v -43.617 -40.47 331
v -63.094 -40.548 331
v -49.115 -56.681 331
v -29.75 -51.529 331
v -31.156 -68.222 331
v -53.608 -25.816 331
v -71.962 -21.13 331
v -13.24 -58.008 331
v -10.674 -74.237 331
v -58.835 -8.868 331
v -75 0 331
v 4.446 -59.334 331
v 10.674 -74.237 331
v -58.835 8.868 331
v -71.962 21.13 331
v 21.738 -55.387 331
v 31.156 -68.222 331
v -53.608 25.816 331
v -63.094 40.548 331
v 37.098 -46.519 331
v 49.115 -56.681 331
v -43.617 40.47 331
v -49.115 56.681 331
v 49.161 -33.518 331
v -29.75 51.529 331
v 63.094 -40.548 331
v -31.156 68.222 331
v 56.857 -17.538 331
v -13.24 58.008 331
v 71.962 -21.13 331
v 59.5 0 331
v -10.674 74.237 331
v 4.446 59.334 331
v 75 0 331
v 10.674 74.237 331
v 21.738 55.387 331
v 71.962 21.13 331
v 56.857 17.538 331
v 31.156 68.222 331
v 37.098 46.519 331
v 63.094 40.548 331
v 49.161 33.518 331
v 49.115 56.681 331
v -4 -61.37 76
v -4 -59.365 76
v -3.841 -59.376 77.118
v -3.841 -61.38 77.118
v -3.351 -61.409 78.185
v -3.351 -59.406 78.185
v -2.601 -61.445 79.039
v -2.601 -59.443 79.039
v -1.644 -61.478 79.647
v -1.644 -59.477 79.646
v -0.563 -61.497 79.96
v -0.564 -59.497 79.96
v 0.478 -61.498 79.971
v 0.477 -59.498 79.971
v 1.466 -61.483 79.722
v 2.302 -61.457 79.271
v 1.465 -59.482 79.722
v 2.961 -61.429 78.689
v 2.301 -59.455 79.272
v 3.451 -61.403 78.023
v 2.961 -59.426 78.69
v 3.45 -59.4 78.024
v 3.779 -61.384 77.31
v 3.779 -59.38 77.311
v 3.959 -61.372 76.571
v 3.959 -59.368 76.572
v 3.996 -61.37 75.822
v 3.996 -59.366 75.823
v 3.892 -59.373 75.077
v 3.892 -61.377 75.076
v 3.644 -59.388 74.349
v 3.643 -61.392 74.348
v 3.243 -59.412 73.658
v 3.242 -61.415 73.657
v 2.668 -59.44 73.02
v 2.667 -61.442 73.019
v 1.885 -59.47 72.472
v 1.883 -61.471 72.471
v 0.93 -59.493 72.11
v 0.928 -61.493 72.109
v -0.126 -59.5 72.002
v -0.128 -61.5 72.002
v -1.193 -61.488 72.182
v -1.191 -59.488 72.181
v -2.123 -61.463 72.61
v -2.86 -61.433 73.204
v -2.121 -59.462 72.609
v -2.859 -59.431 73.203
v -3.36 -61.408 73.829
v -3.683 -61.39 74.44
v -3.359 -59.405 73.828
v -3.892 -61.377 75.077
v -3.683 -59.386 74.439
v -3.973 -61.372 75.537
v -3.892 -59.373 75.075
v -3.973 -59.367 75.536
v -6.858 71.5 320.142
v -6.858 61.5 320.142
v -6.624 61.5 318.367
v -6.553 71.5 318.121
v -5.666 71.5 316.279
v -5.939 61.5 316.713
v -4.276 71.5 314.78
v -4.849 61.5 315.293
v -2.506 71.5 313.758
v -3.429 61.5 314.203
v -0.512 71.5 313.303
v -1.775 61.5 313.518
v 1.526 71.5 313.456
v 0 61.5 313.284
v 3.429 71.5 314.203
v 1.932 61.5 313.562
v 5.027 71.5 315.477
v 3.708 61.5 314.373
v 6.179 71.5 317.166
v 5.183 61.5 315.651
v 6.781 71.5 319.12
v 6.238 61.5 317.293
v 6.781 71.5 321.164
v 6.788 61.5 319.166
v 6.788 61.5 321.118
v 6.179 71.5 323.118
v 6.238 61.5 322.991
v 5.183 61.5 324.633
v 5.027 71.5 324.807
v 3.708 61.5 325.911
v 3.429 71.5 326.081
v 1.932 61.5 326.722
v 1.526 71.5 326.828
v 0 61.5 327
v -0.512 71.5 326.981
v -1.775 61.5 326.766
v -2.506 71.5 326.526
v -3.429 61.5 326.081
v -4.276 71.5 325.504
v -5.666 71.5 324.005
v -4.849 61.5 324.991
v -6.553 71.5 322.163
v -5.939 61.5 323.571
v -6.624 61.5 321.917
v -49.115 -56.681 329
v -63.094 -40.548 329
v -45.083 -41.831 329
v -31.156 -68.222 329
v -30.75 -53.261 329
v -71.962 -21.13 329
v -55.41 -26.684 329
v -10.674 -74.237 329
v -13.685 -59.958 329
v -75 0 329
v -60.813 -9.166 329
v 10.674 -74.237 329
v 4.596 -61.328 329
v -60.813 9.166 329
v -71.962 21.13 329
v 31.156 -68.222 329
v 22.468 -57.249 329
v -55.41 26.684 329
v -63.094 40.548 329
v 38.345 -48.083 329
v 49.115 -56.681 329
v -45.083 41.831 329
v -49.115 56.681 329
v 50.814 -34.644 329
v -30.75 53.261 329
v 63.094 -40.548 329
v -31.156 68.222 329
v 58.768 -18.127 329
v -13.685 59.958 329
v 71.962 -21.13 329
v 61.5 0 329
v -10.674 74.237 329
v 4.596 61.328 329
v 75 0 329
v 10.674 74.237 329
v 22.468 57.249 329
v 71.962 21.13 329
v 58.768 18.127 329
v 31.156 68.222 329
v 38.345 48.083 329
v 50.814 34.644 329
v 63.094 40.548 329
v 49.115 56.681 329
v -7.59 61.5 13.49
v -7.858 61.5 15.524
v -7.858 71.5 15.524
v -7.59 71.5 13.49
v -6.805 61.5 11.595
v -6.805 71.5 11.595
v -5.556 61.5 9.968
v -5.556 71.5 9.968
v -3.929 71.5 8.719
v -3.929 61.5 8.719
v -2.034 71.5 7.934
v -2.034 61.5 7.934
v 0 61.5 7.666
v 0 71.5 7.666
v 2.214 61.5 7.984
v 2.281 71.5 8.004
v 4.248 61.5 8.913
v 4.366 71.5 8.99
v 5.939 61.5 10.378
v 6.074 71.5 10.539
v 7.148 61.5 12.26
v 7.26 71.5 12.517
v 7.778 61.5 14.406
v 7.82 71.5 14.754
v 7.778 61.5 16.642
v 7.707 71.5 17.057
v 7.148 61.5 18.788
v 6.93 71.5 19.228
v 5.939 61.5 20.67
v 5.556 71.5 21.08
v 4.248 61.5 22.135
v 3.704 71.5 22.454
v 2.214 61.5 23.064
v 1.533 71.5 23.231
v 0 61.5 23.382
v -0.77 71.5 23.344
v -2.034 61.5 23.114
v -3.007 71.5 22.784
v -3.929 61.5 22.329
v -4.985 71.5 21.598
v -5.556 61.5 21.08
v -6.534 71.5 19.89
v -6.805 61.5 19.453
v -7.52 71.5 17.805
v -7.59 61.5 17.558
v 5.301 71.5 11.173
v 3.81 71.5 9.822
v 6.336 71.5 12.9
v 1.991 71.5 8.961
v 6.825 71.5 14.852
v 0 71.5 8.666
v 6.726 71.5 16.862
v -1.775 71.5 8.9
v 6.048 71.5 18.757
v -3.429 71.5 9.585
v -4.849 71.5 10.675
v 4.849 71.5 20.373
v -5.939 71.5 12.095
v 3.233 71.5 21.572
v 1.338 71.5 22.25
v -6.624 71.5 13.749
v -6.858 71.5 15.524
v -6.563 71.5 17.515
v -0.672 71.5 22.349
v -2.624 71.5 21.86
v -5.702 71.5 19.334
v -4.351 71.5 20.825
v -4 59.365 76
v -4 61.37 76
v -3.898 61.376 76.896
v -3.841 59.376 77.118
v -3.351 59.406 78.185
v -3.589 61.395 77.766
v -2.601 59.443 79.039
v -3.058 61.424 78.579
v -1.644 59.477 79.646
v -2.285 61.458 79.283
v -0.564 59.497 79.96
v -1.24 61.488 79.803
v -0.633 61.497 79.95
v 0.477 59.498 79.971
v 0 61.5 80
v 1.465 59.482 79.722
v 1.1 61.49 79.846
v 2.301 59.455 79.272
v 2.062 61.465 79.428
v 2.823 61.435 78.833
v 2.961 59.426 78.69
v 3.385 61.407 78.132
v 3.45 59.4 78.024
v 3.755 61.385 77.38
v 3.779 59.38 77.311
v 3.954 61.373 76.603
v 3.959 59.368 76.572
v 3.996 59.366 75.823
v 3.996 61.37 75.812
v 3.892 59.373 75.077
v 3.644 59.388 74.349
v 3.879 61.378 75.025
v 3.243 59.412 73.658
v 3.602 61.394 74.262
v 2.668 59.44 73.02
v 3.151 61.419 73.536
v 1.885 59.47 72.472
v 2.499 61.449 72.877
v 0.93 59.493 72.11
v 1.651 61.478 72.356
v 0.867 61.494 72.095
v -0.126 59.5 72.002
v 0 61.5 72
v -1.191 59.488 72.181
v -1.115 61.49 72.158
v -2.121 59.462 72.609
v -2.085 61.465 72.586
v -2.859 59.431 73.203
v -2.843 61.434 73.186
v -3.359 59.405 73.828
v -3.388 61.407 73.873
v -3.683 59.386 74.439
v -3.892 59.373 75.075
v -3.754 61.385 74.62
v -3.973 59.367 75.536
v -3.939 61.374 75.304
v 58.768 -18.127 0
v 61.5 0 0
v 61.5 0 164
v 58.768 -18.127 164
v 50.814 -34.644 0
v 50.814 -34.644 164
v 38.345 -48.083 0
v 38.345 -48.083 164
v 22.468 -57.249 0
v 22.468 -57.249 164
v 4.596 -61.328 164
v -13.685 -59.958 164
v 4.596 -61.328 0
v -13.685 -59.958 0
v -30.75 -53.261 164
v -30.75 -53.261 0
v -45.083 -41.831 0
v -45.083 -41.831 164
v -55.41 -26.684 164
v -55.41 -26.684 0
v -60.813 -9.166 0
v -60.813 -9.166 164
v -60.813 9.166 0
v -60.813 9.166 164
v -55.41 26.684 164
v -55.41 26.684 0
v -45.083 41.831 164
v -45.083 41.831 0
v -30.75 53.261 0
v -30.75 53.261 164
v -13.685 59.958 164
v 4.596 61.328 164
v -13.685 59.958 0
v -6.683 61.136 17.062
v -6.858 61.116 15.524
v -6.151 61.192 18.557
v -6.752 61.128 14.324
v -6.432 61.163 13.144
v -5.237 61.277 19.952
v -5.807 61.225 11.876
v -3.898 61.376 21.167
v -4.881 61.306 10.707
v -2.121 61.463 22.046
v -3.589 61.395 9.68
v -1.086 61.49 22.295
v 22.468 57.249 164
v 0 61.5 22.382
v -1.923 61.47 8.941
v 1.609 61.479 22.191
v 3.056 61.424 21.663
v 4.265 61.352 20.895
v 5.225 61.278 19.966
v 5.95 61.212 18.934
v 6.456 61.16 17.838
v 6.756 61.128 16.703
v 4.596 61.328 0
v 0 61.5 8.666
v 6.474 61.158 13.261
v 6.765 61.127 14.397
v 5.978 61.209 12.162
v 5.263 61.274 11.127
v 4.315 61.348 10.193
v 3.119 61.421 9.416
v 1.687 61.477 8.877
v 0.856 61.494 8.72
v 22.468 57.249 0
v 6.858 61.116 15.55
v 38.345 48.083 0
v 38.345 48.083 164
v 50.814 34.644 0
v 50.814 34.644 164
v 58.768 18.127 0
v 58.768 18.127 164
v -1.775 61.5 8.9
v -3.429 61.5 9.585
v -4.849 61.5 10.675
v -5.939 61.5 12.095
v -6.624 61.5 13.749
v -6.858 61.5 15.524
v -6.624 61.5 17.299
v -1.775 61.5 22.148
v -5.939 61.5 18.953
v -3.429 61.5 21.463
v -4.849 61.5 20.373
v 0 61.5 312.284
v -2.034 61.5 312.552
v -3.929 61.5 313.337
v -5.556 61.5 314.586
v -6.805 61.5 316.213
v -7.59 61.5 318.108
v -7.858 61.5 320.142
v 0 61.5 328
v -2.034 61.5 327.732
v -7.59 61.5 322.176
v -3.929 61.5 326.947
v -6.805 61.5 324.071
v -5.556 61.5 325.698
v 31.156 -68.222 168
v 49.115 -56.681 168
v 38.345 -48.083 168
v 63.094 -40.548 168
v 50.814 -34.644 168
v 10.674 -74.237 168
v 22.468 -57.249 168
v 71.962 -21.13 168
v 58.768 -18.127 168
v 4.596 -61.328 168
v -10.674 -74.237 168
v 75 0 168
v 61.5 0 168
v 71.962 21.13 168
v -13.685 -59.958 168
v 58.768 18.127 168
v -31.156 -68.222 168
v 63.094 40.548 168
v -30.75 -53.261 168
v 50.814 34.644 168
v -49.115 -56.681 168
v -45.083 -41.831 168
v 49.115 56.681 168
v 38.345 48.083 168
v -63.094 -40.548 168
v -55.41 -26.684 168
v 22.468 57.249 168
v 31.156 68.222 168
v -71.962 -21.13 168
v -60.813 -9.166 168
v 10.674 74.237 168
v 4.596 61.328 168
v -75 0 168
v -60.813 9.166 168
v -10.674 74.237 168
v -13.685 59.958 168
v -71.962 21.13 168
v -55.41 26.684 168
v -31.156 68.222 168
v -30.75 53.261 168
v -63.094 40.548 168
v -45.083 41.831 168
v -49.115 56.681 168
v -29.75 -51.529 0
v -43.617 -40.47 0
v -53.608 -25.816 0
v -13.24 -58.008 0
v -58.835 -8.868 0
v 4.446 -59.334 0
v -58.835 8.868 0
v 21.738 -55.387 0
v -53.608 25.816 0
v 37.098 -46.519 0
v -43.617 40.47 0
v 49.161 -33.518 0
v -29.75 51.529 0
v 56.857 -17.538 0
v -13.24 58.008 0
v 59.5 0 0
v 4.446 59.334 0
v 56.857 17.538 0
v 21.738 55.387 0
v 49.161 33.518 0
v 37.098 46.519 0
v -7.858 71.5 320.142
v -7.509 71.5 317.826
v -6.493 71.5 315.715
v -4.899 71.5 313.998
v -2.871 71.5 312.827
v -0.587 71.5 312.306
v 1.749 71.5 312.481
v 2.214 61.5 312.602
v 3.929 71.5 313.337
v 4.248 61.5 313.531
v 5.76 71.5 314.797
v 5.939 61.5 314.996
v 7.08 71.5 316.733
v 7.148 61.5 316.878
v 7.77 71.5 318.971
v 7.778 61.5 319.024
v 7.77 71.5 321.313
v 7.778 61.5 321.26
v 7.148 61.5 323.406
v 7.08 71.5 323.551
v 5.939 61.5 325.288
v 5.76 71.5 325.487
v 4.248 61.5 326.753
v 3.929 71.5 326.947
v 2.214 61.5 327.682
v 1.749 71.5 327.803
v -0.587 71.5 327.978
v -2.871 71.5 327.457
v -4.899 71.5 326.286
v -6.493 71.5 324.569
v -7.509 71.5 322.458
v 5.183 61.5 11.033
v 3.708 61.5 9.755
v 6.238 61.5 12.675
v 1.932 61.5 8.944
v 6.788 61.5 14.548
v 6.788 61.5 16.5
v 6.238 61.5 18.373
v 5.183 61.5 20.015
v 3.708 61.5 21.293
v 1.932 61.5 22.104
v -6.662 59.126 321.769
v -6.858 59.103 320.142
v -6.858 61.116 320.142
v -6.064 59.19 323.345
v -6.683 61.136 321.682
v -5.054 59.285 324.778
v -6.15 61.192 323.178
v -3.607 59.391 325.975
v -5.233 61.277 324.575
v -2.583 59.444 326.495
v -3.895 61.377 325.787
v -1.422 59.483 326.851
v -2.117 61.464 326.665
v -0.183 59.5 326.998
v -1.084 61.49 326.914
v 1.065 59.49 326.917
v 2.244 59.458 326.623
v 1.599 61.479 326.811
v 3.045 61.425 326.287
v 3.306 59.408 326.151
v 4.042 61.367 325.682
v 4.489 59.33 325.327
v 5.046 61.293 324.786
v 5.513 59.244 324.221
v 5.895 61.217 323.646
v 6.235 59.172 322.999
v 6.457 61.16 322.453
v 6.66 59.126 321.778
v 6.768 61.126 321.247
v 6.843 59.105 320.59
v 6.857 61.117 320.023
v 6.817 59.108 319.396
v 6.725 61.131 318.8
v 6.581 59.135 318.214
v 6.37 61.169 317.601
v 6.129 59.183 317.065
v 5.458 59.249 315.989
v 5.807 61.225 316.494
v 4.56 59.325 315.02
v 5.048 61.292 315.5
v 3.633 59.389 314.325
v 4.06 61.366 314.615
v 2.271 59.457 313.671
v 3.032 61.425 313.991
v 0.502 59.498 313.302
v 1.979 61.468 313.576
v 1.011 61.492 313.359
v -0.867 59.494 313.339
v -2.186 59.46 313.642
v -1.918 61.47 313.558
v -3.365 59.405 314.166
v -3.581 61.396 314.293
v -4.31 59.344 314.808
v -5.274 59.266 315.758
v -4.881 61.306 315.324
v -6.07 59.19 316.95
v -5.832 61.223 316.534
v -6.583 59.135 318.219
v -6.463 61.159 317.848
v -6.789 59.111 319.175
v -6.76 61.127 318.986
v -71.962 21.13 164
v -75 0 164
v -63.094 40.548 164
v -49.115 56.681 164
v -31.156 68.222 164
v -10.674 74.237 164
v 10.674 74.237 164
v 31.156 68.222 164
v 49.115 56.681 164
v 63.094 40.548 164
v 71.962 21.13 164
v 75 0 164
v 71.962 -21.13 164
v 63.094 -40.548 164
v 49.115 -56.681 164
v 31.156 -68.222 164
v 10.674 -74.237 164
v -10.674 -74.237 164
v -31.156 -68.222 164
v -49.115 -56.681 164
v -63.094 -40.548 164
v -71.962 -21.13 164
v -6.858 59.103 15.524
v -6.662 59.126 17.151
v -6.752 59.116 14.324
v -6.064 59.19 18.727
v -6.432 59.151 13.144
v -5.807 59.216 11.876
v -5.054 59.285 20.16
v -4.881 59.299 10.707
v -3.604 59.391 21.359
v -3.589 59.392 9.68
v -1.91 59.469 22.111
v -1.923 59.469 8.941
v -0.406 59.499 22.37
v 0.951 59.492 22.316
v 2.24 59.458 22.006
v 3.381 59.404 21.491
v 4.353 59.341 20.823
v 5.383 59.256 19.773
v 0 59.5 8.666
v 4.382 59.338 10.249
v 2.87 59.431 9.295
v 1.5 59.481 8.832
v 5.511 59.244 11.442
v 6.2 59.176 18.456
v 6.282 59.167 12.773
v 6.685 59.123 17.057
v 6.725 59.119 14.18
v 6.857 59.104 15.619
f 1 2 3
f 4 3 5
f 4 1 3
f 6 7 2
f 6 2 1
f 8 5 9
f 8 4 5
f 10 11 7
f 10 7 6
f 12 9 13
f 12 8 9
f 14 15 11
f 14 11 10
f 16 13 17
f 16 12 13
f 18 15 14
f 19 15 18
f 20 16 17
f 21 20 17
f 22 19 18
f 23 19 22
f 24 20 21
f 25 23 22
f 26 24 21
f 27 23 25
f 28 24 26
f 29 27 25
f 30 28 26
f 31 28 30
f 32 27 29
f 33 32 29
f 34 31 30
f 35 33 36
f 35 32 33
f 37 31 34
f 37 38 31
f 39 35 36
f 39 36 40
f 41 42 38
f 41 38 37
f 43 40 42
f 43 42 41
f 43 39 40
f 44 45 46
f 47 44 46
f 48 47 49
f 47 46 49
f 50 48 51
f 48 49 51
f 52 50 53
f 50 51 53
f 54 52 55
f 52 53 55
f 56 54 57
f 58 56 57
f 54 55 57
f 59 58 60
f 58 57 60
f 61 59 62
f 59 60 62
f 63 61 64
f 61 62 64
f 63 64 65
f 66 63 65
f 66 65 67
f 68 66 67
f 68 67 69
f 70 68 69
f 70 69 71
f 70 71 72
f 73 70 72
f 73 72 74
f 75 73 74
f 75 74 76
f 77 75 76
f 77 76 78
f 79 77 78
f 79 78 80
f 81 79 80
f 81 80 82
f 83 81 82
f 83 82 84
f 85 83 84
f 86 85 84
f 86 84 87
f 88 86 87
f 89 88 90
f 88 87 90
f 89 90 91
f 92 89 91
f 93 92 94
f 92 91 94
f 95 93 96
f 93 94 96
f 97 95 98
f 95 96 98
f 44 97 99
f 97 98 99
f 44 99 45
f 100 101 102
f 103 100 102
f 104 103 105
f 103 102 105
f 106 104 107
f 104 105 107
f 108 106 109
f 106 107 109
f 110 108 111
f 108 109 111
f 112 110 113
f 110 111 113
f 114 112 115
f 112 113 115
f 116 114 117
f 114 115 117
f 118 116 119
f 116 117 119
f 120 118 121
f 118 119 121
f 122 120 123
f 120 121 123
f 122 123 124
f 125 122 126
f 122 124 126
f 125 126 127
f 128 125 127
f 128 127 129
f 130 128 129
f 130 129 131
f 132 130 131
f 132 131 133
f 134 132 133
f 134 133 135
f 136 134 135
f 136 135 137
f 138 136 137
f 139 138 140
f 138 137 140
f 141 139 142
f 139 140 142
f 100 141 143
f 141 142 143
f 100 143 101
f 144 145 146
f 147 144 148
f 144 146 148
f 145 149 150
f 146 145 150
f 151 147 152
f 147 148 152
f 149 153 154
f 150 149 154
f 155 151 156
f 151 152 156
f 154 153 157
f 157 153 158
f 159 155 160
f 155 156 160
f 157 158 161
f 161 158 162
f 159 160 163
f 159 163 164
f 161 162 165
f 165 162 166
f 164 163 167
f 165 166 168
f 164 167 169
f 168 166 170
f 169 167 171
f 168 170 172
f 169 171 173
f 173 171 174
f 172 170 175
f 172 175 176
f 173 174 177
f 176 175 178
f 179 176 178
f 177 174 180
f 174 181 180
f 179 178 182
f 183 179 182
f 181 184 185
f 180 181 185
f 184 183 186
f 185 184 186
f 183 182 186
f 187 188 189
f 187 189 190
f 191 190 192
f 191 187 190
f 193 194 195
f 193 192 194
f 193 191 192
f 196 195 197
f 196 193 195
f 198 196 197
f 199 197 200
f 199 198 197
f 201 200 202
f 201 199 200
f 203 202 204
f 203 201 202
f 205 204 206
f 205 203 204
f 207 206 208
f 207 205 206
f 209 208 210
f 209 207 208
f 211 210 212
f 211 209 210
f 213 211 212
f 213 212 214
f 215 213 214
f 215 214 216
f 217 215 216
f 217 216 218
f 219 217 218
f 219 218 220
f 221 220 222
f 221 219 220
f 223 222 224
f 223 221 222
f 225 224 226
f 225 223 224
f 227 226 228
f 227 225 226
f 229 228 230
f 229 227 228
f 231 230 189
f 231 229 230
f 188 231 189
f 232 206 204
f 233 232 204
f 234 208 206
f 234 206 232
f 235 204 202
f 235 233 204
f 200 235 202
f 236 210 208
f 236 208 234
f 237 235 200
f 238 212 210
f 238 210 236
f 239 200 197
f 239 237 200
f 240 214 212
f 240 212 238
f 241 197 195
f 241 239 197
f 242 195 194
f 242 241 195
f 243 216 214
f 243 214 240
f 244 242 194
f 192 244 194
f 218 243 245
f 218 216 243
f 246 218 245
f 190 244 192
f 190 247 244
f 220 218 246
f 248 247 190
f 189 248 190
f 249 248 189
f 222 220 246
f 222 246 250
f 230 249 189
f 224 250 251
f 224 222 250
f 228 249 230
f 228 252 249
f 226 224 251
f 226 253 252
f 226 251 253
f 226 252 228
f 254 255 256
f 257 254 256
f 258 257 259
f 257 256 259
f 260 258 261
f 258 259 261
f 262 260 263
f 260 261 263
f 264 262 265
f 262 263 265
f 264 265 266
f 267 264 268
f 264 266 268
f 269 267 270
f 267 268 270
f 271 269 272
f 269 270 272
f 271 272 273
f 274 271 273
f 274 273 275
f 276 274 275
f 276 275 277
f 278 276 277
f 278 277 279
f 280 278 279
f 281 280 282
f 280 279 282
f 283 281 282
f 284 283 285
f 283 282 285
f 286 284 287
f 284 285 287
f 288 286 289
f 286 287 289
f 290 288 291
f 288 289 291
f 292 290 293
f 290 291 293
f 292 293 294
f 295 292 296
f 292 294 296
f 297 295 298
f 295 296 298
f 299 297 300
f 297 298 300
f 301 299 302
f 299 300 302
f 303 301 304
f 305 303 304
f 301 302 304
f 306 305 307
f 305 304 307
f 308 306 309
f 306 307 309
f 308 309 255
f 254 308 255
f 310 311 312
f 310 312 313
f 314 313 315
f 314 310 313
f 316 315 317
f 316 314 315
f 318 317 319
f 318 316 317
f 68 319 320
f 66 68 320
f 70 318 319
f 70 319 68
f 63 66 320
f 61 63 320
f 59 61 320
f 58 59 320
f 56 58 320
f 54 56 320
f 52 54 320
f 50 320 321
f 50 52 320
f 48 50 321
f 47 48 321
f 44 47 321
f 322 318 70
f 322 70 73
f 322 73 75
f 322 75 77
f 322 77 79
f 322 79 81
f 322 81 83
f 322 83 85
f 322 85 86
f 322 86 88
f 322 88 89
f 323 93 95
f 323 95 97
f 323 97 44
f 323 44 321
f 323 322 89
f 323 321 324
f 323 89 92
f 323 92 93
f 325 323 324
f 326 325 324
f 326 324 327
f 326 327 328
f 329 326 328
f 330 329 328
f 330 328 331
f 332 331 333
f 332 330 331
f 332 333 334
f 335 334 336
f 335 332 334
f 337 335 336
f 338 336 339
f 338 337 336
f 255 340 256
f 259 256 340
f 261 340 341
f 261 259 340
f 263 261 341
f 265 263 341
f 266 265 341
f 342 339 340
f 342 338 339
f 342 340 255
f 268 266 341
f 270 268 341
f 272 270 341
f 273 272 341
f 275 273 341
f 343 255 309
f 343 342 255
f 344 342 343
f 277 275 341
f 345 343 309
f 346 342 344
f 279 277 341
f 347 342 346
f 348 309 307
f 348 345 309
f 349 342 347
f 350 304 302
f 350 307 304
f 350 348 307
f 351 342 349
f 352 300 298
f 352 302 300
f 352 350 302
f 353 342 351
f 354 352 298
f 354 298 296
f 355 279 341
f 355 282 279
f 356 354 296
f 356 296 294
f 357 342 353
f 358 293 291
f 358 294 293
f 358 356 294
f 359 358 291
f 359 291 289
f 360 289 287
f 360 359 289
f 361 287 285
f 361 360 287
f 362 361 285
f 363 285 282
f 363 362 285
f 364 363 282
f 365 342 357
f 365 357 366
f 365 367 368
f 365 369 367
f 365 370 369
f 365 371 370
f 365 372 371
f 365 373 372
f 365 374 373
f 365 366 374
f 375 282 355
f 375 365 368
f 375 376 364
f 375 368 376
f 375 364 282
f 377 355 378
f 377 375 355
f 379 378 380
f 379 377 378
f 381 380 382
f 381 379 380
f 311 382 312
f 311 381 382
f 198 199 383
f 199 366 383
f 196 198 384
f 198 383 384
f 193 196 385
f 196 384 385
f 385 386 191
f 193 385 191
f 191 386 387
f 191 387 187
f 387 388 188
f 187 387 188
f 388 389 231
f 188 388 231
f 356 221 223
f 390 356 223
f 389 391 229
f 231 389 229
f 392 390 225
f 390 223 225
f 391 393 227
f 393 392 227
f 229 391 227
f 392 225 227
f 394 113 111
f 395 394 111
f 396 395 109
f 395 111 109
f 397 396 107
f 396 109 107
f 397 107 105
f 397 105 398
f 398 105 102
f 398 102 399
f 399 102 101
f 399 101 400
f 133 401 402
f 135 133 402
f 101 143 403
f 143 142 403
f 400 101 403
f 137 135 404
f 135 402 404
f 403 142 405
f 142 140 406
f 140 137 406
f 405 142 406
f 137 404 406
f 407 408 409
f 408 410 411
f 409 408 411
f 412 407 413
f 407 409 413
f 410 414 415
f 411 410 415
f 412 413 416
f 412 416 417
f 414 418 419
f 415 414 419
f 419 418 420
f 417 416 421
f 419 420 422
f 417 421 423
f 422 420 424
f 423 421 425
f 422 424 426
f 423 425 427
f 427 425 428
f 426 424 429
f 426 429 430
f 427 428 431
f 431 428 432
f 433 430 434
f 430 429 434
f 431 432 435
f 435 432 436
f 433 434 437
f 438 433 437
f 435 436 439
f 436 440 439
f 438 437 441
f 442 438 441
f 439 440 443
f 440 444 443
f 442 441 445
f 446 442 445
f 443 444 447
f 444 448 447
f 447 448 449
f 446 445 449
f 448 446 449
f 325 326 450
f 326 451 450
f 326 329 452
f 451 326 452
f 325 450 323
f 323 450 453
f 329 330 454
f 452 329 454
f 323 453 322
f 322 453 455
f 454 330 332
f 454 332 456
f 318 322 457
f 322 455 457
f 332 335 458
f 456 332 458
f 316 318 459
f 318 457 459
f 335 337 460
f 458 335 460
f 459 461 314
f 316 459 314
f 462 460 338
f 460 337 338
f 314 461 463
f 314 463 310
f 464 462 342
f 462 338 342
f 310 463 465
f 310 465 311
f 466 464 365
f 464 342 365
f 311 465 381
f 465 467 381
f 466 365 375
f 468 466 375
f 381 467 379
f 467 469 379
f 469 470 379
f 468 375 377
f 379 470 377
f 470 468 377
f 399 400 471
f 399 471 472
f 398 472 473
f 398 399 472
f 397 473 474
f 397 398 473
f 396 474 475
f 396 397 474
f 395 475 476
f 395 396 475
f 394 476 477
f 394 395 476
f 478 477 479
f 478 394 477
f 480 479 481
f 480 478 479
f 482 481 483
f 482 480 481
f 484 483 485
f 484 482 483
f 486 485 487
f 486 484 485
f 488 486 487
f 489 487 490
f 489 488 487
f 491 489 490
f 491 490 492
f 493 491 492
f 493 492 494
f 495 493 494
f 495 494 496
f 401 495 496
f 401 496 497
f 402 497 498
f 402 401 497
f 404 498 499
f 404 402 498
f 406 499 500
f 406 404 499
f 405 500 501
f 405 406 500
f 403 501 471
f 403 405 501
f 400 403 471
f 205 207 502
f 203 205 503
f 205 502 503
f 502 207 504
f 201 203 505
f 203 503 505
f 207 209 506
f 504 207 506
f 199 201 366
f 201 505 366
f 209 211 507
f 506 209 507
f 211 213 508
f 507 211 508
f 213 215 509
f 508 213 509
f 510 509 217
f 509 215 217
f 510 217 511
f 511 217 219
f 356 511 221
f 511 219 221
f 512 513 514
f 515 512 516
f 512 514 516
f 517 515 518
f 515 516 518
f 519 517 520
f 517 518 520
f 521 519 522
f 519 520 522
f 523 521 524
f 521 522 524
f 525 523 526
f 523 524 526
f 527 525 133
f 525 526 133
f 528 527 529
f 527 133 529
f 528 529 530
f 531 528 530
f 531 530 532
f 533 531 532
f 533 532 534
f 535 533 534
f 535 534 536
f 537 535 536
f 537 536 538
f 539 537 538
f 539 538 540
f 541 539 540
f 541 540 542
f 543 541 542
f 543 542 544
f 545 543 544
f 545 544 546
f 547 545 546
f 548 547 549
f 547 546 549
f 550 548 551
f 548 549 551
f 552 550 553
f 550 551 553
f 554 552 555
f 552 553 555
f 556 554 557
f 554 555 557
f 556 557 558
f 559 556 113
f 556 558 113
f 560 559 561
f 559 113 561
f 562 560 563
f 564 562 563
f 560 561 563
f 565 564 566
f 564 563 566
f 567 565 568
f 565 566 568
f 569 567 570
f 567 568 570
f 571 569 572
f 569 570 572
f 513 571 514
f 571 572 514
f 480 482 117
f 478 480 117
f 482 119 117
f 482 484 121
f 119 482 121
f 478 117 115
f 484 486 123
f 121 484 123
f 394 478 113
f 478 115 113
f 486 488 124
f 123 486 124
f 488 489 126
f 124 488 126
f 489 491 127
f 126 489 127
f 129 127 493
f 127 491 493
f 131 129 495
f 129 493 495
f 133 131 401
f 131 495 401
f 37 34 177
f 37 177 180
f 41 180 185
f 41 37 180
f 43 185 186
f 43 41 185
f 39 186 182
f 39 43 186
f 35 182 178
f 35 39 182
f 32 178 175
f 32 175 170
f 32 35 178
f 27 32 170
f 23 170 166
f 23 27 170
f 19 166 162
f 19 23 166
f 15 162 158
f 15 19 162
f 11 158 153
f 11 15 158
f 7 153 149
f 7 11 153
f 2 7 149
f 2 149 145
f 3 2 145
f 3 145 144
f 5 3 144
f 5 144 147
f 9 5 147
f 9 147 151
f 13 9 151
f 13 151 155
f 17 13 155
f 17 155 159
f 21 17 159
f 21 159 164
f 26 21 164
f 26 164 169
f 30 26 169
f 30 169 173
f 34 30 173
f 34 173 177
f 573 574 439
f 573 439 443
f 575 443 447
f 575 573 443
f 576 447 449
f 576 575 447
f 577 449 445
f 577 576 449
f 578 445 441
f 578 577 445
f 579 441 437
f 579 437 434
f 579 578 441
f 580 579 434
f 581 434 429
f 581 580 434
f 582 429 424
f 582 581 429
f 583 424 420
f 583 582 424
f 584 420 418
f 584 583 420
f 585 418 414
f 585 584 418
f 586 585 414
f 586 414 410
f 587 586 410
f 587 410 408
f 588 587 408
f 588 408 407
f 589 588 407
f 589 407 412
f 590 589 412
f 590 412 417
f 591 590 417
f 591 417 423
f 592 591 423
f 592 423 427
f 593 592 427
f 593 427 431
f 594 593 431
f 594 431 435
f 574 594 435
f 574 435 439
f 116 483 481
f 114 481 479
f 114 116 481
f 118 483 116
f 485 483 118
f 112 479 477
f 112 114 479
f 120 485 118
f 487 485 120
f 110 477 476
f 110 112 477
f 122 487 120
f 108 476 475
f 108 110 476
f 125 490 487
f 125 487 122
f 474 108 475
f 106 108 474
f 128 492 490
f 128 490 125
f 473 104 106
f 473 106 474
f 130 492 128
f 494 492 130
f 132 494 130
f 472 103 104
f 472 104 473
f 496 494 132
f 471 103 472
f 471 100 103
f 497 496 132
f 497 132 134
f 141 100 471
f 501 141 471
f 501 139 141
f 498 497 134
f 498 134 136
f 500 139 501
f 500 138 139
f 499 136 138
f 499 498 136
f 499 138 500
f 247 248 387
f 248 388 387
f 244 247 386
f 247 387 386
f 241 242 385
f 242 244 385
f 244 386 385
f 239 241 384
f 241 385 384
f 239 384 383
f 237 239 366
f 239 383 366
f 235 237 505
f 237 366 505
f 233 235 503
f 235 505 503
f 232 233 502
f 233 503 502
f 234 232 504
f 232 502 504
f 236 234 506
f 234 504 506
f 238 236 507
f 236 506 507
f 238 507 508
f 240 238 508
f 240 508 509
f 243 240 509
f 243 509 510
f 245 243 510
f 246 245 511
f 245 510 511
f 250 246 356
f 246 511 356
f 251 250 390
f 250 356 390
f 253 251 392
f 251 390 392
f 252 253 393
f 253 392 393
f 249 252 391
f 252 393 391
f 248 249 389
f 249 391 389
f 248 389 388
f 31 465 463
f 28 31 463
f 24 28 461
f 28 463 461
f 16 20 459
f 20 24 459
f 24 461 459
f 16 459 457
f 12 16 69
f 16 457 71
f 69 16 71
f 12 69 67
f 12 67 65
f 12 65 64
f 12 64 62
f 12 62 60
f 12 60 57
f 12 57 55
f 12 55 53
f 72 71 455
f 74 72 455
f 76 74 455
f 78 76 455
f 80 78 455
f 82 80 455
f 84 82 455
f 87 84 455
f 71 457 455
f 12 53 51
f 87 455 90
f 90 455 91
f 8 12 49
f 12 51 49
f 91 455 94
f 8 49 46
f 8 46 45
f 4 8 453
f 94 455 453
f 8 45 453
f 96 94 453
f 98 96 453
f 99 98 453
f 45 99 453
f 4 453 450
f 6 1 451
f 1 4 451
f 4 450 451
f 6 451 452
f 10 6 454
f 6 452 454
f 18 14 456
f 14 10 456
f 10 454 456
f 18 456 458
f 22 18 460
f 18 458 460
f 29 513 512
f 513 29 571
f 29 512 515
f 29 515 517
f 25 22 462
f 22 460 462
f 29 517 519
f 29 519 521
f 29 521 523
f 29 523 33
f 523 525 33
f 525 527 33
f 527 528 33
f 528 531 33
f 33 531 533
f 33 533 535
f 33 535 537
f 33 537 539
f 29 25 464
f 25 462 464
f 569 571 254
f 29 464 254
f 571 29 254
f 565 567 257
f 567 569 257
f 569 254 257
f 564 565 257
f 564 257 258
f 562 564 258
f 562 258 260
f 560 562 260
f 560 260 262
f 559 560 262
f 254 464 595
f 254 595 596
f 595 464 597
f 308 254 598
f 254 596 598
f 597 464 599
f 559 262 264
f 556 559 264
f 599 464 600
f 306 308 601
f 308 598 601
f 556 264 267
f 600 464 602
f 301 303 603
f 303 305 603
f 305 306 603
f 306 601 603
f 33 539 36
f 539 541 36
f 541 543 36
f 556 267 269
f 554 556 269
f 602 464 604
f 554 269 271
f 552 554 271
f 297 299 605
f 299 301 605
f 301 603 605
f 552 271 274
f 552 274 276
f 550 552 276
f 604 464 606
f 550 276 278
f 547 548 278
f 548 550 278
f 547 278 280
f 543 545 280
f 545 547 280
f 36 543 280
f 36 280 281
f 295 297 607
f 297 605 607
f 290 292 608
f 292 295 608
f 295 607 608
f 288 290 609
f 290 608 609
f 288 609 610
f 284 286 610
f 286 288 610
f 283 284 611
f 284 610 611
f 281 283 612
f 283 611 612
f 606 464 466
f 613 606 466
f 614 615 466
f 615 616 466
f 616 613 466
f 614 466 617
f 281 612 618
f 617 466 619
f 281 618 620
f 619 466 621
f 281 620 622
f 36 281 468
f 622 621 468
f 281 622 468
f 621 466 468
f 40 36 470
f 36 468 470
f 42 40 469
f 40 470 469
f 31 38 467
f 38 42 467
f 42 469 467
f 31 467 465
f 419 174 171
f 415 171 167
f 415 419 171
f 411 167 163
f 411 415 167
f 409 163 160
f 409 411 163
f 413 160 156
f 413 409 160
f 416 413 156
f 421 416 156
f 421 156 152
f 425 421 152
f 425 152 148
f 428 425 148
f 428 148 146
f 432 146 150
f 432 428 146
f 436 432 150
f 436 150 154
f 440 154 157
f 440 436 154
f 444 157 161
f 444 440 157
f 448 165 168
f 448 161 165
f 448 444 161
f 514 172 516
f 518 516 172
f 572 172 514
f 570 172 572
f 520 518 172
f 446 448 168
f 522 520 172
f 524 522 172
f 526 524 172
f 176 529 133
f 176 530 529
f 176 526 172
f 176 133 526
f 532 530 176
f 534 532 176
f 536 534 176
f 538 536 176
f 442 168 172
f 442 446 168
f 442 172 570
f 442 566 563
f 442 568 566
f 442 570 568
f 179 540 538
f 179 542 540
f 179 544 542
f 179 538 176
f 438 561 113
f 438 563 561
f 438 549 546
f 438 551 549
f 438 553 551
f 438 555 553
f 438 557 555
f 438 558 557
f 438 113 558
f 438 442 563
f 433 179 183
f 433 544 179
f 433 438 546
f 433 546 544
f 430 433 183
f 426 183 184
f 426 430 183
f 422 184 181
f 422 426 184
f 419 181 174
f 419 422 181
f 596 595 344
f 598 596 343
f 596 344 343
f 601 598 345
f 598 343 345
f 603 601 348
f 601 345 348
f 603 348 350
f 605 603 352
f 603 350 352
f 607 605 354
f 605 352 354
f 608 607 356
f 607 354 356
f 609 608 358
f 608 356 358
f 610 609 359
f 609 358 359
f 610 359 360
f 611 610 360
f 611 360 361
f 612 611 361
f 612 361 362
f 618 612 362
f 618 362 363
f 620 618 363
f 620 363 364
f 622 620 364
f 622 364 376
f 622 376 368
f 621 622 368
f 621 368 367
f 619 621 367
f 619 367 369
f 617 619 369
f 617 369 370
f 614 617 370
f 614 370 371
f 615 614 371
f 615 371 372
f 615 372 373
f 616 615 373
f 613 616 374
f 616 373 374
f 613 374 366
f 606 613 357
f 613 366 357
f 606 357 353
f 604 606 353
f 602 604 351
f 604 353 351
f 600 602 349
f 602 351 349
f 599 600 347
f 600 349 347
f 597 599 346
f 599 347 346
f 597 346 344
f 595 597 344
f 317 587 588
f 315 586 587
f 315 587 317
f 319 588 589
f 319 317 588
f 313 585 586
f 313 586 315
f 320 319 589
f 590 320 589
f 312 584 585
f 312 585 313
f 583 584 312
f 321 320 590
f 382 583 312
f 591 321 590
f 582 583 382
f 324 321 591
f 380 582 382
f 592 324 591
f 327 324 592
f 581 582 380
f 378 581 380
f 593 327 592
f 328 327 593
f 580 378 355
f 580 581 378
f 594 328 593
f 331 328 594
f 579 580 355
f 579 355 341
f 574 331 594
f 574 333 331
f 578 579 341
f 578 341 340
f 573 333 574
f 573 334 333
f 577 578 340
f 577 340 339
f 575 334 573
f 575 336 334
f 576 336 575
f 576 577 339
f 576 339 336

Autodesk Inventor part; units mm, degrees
ref_plane "YZ Plane" through (0, 0, 0) normal (1, 0, 0) x (0, 1, 0)
ref_plane "XY Plane" through (0, 0, 0) normal (0, 0, 1) x (1, 0, 0)
sketch "Sketch1" plane through (0, 0, 0) normal (0, 0, 1) x (1, 0, 0)
  circle A0 centre (0, 0) radius 59.5
  circle A1 centre (0, 0) radius 61.5
  dimension "d0" = 119
  dimension "d1" = 123
extrude "Extrusion1" add sketch "Sketch1" along normal blind 331
ref_plane "Work Plane1" through (0, 61.5, 0) normal (0, 1, 0) x (-1, 0, 0)
sketch "Sketch2" plane through (0, 61.5, 0) normal (0, 1, 0) x (-1, 0, 0)
  line L0 (61.5, 0) -> (-61.5, 0) projected
  line L1 (0, 0) -> (0, 4)
  line L2 (0, 4) -> (0, 8.666)
  circle A0 centre (0, 15.524) radius 6.858
  circle A1 centre (0, 15.524) radius 7.858
  dimension "d6" = 4
  dimension "d7" = 4.666
  dimension "d8" = 13.716
  dimension "d9" = 6.858
  dimension "d33" = 15.716
extrude "Extrusion2" cut sketch "Sketch2" against normal blind 23 contours A0
sketch "Sketch3" plane through (0, 61.5, 0) normal (0, 1, 0) x (-1, 0, 0)
  line L0 (0, 0) -> (0, 331) construction
  line L1 (-59.5, 331) -> (59.5, 331) projected
  line L2 (0, 331) -> (0, 323) construction
  circle A0 centre (0, 320.142) radius 6.858
  circle A1 centre (0, 320.142) radius 7.858
  point P0 (0, 327)
  dimension "d12" = 8
  dimension "d13" = 13.716
  dimension "d14" = 6.858
  dimension "d36" = 15.716
extrude "Extrusion3" cut sketch "Sketch3" against normal blind 3 contours A0
thread "Thread1" size "M14x1.25" class "6H" standard "ANSI Metric M Profile" full length
thread "Thread2" size "M14x1.25" class "6H" standard "ANSI Metric M Profile" full length
sketch "Sketch4" plane through (0, 61.5, 0) normal (0, 1, 0) x (-1, 0, 0)
  point P0 (0, 0)
sketch "Sketch5" plane through (0, 61.5, 0) normal (0, 1, 0) x (-1, 0, 0)
  line L0 (0, 0) -> (0, 76) construction
  circle A0 centre (0, 76) radius 4
  dimension "d21" = 76
  dimension "d22" = 8
extrude "Extrusion4" cut sketch "Sketch5" against normal through all
thread "Thread3" size "M8x1.25" class "6H" standard "ANSI Metric M Profile" full length
thread "Thread4" size "M8x1.25" class "6H" standard "ANSI Metric M Profile" full length
sketch "Sketch6" plane through (0, 0, 331) normal (0, 0, 1) x (1, 0, 0)
  circle A0 centre (0, 0) radius 75
  circle A1 centre (0, 0) radius 61.5
  dimension "d29" = 150
  dimension "d30" = 123
extrude "Extrusion5" add sketch "Sketch6" against normal blind 2
extrude "Extrusion6" add sketch "Sketch2" along normal blind 10
extrude "Extrusion7" add sketch "Sketch3" along normal blind 10
ref_plane "Work Plane2" through (0, 0, 166) normal (0, 0, -1) x (-1, 0, 0)
split_face "Split2"
sketch "Sketch7" plane through (0, 0, 166) normal (0, 0, -1) x (-1, 0, 0)
  circle A0 centre (0, 0) radius 75
  circle A1 centre (0, 0) radius 59.5 projected
  circle A2 centre (0, 0) radius 59.5
  dimension "d40" = 150
extrude "Extrusion8" add sketch "Sketch7" along normal blind 2
extrude "Extrusion9" add sketch "Sketch7" against normal blind 2
properties part number "stainless steel outer wall" material "Aluminum 6061"
